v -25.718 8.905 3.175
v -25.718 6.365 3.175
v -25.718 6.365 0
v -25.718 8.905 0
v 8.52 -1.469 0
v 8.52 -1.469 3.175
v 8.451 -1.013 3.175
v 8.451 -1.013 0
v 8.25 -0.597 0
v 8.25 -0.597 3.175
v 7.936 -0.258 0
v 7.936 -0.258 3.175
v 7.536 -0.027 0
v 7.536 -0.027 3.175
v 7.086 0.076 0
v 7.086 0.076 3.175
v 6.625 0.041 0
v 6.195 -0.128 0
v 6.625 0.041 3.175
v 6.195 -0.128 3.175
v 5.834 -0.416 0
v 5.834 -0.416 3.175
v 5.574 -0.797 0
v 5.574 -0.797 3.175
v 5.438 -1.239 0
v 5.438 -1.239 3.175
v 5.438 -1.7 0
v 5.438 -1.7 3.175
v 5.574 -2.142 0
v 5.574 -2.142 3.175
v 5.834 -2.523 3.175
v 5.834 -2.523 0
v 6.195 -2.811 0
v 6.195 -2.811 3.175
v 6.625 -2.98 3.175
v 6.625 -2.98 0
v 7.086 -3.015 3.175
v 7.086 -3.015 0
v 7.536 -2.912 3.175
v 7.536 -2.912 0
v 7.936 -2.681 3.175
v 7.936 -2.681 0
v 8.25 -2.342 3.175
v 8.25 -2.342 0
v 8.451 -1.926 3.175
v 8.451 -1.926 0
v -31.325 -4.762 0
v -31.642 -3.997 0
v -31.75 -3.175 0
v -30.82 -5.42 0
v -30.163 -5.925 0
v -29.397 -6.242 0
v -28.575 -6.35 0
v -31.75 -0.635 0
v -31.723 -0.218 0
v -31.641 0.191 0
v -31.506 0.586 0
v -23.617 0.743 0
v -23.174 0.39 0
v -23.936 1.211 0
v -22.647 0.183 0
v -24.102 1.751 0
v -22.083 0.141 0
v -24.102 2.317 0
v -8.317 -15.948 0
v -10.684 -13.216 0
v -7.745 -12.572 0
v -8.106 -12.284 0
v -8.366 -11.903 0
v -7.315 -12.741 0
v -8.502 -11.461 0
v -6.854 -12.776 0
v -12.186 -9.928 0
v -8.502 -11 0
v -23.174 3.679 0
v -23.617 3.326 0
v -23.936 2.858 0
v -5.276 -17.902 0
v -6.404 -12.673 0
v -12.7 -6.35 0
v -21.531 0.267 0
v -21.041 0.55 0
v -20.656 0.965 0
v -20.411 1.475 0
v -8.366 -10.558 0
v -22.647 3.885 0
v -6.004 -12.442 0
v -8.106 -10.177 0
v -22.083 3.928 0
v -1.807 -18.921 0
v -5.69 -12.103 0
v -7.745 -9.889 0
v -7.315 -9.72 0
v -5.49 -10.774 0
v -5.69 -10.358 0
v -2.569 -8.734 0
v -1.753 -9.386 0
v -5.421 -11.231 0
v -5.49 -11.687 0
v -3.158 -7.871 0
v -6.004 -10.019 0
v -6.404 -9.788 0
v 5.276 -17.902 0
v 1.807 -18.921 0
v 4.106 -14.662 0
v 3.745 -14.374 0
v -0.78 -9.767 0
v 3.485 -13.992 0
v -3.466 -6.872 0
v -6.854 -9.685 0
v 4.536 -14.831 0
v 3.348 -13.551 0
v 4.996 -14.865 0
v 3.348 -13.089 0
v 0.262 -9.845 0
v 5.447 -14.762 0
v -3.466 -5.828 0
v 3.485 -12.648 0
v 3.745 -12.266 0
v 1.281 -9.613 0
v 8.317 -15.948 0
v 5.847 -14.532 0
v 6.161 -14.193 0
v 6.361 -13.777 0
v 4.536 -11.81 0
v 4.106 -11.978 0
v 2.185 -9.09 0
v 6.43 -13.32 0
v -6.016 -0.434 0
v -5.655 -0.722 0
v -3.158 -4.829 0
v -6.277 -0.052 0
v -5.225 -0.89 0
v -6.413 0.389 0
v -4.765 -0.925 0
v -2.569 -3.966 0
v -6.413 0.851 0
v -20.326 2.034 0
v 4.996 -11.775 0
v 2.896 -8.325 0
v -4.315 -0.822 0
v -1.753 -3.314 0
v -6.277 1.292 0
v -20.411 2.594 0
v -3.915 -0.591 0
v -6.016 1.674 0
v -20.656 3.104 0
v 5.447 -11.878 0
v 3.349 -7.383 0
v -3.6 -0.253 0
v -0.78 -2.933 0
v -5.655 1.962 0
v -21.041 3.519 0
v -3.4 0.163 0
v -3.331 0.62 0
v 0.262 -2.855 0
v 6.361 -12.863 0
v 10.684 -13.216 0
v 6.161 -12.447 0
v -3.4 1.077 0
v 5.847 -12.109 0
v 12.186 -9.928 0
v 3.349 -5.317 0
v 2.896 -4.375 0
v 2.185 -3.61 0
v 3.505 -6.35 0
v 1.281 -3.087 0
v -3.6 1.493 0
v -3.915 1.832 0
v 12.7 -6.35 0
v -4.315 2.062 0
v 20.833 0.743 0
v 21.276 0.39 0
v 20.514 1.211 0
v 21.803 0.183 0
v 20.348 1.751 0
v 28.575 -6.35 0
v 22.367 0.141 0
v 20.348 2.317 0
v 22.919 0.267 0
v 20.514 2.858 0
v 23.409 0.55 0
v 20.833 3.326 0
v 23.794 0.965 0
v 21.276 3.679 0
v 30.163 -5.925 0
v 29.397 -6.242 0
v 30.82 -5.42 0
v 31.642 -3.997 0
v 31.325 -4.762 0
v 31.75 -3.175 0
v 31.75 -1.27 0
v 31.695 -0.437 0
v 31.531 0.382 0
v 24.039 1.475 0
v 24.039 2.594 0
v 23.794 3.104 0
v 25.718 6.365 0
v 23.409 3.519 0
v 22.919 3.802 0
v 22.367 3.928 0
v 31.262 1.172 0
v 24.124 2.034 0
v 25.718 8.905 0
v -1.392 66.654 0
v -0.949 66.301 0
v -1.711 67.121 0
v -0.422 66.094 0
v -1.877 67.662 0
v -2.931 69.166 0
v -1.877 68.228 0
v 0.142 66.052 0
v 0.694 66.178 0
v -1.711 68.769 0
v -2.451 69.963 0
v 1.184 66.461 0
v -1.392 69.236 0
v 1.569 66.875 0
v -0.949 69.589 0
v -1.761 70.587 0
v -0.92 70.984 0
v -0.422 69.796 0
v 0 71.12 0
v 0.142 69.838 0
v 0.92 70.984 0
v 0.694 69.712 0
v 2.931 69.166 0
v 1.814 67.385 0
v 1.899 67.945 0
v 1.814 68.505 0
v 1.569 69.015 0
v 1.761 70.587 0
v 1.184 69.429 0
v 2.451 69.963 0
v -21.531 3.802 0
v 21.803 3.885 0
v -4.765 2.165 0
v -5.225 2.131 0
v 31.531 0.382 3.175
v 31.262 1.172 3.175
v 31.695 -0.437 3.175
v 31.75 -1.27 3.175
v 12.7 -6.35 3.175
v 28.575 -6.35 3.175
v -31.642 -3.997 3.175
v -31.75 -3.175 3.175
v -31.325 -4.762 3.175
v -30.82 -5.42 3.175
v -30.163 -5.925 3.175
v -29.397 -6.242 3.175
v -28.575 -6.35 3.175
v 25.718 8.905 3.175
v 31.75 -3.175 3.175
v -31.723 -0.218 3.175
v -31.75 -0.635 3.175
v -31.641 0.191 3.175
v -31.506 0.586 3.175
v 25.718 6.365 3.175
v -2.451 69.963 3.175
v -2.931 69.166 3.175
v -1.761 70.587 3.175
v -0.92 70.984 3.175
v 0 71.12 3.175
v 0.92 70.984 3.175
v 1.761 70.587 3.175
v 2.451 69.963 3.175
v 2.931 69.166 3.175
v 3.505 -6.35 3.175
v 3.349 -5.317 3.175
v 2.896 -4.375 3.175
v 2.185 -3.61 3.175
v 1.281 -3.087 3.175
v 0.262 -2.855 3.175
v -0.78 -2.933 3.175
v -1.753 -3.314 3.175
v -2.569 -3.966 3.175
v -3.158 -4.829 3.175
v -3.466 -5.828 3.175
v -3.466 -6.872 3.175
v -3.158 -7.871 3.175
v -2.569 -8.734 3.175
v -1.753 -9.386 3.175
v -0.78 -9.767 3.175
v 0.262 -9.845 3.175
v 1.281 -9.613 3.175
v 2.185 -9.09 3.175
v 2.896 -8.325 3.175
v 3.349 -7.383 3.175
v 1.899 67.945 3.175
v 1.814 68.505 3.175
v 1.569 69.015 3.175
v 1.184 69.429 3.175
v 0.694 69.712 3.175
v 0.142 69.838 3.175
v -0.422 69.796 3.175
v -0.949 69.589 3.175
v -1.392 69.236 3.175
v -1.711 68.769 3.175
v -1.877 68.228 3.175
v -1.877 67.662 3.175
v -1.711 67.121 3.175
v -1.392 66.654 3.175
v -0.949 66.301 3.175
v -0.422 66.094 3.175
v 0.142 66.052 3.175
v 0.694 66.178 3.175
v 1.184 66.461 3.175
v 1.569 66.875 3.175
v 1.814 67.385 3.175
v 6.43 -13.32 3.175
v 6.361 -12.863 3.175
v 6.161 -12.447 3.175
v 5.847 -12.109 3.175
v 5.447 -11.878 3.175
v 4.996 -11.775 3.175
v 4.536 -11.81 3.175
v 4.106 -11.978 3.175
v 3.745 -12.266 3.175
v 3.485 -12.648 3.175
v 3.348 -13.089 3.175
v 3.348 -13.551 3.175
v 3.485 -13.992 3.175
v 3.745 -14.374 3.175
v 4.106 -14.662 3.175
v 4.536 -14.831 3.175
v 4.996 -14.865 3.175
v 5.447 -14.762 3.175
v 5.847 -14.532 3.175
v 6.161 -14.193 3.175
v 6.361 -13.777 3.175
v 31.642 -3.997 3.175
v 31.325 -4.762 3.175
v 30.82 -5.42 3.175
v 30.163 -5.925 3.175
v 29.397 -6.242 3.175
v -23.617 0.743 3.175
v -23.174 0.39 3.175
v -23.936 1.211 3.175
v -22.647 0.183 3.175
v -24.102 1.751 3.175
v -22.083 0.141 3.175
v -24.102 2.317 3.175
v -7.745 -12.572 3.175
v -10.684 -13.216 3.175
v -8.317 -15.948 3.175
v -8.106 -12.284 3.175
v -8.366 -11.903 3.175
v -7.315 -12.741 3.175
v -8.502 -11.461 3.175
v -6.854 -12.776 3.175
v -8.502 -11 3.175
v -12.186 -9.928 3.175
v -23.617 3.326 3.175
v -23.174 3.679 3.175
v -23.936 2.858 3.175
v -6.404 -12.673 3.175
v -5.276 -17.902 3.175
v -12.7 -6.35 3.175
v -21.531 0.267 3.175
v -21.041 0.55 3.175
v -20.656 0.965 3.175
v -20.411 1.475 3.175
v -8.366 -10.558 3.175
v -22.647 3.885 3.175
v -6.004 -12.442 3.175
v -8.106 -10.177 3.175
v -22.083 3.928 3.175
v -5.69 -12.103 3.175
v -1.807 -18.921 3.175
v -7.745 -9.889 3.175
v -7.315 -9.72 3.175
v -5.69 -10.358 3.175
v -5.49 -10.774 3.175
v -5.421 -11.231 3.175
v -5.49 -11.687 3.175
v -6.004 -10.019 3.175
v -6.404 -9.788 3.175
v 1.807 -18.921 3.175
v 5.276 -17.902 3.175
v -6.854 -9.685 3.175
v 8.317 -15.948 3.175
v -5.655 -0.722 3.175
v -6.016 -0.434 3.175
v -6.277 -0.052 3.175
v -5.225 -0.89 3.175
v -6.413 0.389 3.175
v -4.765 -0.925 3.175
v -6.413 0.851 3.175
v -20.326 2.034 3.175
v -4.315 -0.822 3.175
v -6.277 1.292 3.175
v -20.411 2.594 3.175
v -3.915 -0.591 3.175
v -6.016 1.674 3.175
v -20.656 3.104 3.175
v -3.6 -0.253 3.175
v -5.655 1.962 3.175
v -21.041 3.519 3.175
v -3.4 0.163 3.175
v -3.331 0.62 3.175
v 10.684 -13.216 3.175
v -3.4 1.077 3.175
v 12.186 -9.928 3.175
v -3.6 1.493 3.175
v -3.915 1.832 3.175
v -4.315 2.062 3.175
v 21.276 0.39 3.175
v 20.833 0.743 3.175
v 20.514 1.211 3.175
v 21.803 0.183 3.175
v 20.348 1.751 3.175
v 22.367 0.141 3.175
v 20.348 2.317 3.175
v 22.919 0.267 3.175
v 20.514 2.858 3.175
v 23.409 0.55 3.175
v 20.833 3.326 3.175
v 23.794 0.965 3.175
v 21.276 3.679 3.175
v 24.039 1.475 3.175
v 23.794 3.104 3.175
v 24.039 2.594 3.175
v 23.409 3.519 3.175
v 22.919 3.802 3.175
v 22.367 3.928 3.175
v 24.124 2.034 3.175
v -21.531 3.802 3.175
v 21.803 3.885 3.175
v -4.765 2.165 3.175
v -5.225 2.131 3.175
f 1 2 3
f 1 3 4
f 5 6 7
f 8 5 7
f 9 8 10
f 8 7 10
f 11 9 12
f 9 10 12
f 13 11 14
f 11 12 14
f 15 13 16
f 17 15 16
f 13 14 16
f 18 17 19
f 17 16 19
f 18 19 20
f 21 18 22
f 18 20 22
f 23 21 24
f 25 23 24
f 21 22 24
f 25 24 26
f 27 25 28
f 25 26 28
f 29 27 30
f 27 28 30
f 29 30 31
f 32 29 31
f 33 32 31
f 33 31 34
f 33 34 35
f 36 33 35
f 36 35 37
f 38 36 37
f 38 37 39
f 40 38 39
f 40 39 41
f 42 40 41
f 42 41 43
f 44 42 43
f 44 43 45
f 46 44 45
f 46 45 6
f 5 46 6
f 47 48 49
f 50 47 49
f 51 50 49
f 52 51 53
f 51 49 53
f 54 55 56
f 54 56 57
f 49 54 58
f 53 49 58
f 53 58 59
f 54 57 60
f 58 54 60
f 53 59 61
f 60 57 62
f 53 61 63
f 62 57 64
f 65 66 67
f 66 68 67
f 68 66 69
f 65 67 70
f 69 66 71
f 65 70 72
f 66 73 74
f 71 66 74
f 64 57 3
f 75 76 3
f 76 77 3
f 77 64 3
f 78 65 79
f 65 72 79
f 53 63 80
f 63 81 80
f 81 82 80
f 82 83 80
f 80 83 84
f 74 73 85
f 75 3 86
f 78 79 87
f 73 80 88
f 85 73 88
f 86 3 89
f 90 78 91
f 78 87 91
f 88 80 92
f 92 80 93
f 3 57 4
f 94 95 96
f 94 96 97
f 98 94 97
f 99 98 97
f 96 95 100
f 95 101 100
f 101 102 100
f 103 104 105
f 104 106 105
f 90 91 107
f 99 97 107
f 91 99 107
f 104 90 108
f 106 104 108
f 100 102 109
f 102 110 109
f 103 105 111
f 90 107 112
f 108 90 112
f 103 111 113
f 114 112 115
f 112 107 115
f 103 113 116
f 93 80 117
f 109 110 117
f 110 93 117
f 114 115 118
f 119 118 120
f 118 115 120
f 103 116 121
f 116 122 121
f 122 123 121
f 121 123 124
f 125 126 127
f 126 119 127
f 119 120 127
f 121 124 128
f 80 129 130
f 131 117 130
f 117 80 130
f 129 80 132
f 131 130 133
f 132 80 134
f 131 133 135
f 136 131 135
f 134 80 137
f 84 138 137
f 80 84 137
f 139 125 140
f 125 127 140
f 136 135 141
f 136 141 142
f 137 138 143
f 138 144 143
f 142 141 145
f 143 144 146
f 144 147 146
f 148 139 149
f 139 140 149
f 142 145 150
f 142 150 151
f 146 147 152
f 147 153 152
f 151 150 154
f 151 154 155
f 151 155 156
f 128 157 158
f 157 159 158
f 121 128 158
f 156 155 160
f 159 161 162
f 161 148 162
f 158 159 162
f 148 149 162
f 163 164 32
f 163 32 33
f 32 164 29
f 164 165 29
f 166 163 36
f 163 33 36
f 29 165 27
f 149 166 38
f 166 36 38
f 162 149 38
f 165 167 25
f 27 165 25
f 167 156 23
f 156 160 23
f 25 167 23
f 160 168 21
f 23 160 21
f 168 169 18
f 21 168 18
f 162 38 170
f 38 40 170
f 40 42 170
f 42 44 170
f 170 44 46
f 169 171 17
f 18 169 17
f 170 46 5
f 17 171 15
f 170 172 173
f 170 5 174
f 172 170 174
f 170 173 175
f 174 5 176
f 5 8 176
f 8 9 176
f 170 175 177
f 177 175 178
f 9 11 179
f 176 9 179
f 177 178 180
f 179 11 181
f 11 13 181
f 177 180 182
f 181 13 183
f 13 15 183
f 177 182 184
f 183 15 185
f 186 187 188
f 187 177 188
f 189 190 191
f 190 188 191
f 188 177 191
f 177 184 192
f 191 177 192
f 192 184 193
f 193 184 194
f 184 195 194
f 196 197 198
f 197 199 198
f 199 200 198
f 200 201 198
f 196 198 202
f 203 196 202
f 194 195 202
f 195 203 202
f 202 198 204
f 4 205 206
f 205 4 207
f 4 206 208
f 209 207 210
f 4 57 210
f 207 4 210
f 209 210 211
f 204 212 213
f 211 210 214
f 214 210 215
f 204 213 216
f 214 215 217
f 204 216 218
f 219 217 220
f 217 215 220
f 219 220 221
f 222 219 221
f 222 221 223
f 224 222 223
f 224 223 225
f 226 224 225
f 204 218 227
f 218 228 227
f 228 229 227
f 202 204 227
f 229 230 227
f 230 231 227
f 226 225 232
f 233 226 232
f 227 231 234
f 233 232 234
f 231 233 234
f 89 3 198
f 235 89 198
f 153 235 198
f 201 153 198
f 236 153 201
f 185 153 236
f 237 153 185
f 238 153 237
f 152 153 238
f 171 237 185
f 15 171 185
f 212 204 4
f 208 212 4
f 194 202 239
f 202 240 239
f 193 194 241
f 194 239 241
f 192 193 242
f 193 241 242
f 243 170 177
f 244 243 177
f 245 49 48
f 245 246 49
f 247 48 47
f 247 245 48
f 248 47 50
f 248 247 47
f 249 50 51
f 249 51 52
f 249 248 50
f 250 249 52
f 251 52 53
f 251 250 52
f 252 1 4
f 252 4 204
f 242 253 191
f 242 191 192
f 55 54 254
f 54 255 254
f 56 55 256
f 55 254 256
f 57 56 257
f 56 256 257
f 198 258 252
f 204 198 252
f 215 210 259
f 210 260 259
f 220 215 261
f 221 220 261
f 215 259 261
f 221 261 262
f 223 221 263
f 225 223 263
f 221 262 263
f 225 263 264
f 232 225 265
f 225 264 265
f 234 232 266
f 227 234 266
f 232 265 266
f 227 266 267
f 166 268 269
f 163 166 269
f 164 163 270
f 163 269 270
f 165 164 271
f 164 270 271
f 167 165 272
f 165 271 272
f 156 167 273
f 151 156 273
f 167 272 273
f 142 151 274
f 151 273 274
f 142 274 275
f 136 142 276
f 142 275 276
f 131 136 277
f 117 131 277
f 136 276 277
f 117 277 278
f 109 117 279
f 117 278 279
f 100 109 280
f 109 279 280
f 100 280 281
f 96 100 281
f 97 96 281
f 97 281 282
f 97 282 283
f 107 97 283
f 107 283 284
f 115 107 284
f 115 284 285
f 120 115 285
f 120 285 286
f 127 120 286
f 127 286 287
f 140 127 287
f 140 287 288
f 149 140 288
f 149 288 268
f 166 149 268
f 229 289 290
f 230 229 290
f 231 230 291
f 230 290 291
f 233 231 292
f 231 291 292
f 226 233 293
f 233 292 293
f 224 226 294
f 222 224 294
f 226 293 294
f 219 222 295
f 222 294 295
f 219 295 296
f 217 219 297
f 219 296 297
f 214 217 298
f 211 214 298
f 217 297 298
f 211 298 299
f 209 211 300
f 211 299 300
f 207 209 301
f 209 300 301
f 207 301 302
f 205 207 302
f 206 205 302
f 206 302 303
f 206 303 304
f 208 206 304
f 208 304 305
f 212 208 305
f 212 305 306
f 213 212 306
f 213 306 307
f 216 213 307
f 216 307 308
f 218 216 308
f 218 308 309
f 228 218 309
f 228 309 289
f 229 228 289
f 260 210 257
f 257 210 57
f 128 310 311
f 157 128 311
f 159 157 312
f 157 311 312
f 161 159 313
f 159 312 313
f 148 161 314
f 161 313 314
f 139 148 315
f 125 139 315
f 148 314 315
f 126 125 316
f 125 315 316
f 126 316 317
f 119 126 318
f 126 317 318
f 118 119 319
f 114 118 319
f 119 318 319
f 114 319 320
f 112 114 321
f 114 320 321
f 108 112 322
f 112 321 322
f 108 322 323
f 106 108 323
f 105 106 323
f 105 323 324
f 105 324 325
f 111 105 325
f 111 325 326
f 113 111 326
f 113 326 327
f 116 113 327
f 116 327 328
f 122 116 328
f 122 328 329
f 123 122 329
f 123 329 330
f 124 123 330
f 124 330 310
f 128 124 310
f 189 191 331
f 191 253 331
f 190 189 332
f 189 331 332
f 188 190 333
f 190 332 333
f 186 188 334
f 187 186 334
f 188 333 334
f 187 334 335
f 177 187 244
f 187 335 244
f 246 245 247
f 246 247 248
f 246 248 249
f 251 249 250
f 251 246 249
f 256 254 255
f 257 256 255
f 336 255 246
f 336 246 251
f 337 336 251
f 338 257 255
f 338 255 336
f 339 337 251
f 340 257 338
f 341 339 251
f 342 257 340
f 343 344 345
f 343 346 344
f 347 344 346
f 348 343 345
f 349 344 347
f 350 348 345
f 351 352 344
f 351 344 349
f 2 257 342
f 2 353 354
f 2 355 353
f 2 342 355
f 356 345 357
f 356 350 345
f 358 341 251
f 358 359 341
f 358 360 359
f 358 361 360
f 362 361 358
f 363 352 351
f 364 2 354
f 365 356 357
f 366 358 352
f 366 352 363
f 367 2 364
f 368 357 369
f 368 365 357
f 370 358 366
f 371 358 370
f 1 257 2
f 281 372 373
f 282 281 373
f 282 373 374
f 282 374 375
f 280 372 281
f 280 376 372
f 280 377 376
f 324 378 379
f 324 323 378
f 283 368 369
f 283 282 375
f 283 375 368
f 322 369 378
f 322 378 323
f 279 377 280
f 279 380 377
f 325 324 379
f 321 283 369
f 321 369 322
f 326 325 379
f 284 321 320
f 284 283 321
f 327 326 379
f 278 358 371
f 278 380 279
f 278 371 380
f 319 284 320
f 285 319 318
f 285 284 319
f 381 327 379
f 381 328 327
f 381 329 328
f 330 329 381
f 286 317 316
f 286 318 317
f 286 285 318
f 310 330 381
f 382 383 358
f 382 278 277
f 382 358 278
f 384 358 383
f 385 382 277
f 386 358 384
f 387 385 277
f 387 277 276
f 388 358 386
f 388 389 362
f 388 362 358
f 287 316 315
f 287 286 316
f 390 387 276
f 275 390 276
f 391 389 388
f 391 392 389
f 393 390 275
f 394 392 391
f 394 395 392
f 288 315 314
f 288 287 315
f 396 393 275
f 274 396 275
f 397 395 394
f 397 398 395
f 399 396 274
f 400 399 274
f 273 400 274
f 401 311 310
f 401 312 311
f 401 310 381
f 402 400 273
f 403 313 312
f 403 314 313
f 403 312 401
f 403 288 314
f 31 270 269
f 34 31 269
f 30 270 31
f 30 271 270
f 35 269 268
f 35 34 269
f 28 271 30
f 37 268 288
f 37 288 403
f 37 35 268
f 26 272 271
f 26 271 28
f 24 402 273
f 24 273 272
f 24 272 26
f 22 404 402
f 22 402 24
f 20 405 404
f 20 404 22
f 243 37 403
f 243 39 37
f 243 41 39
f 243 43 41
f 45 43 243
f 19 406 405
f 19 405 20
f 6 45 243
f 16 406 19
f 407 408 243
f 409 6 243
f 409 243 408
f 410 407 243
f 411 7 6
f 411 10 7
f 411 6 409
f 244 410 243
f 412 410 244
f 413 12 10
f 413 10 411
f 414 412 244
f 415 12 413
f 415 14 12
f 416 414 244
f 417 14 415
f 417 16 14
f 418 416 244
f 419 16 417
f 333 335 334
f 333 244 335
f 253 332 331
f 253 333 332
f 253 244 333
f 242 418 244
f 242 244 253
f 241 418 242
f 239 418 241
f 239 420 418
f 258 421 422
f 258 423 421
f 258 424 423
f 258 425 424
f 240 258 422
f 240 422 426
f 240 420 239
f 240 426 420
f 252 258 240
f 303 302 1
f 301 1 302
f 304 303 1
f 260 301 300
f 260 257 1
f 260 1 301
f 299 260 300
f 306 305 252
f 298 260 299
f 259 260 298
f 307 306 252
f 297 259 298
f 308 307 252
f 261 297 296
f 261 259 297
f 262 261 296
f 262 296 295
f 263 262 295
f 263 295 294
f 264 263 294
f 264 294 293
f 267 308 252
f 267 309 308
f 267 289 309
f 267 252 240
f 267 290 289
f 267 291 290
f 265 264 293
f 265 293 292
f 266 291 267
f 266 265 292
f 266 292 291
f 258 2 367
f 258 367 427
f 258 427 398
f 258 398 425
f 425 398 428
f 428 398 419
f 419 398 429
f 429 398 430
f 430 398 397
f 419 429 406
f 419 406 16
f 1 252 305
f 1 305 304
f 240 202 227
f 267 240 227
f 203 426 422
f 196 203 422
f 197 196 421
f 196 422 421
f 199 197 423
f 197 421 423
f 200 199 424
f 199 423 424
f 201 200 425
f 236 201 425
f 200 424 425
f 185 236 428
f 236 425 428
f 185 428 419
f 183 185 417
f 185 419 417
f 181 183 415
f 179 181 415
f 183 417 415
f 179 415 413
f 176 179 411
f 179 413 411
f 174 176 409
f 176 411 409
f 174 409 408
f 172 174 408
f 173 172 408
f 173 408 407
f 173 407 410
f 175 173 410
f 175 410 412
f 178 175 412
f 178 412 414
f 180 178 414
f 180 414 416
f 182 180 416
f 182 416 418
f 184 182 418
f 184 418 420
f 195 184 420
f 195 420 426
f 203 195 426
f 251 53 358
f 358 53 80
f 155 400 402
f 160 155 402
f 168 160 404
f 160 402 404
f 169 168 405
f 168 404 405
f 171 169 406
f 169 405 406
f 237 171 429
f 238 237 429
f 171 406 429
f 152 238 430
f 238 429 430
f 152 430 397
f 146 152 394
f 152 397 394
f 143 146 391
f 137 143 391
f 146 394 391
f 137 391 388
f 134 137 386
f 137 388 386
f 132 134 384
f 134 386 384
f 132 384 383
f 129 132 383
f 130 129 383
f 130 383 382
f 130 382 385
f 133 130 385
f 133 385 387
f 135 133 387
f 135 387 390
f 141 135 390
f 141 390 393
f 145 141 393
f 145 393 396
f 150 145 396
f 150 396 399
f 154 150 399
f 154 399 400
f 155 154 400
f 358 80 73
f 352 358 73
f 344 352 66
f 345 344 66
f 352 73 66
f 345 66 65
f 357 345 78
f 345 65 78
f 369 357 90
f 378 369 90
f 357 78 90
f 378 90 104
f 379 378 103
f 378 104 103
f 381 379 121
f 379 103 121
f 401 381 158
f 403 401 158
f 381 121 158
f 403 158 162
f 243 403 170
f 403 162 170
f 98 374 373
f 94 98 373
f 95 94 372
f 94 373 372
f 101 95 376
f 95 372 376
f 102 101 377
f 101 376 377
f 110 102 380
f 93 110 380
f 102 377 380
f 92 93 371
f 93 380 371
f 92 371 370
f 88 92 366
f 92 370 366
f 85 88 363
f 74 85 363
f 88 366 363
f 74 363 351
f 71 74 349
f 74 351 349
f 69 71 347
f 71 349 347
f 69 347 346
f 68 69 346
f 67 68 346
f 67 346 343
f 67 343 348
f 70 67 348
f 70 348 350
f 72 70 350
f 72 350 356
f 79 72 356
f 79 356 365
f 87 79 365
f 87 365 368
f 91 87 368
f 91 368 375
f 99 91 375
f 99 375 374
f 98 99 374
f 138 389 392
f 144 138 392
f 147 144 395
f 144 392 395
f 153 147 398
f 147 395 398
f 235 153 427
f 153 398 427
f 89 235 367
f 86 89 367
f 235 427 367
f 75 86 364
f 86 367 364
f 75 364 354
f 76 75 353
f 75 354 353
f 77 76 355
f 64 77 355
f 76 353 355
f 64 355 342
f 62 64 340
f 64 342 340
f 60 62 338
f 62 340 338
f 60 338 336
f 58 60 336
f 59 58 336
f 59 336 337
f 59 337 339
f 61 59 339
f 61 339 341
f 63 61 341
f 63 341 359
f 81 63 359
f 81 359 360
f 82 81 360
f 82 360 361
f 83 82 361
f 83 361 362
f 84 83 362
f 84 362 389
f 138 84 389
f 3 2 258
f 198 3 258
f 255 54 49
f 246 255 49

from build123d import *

# Parameters (mm, degrees)
BOSS_EXTRUDE1_DEPTH = 3.175
FILLET4_R           = 3.175
FILLET5_R           = 3.175
FILLET6_R           = 3.175
FILLET7_R           = 6.35
FILLET8_R           = 3.175
SKETCH2_R           = 3.5052
SKETCH2_R_2         = 1.5494
CUT_EXTRUDE1_DEPTH  = 4.175
SKETCH4_W           = 51.435
SKETCH4_H           = 2.54
CUT_EXTRUDE2_DEPTH  = 4.175
SKETCH10_R          = 1.89865
CUT_EXTRUDE3_DEPTH  = 4.175
SKETCH11_R          = 1.89865
CUT_EXTRUDE4_DEPTH  = 4.175


with BuildPart() as part:
    # Sketch1 → Boss-Extrude1 (new body)
    with BuildSketch(Plane.XY):
        with BuildLine():
            Line((-31.75, 0), (-31.75, -6.35))
            Line((-31.75, -6.35), (-12.7, -6.35))
            ThreePointArc((-12.7, -6.35), (0, -19.05), (12.7, -6.35))
            Line((12.7, -6.35), (31.75, -6.35))
            Line((31.75, -6.35), (31.75, 0))
            Line((31.75, 0), (0, 76.2))
            Line((0, 76.2), (-31.75, 0))
        make_face()
    extrude(amount=BOSS_EXTRUDE1_DEPTH)

    # Fillet4
    fillet4_edges = [part.edges().sort_by_distance(p)[0] for p in [
        (-31.75, -6.35, 1.5875),
    ]]
    fillet(fillet4_edges, radius=FILLET4_R)

    # Fillet5
    fillet5_edges = [part.edges().sort_by_distance(p)[0] for p in [
        (-31.75, 0, 1.5875),
    ]]
    fillet(fillet5_edges, radius=FILLET5_R)

    # Fillet6
    fillet6_edges = [part.edges().sort_by_distance(p)[0] for p in [
        (0, 76.2, 1.5875),
    ]]
    fillet(fillet6_edges, radius=FILLET6_R)

    # Fillet7
    fillet7_edges = [part.edges().sort_by_distance(p)[0] for p in [
        (31.75, 0, 1.5875),
    ]]
    fillet(fillet7_edges, radius=FILLET7_R)

    # Fillet8
    fillet8_edges = [part.edges().sort_by_distance(p)[0] for p in [
        (31.75, -6.35, 1.5875),
    ]]
    fillet(fillet8_edges, radius=FILLET8_R)

    # Sketch2 → Cut-Extrude1 (cut, through all)
    with BuildSketch(Plane.XY.offset(3.175)):
        with Locations((0, -6.35)):
            Circle(SKETCH2_R)
        with Locations((-4.880561897, 0.620164745)):
            Circle(SKETCH2_R_2)
        with Locations((4.880561897, -13.320164745)):
            Circle(SKETCH2_R_2)
        with Locations((6.970164745, -1.469438103)):
            Circle(SKETCH2_R_2)
        with Locations((-6.970164745, -11.230561897)):
            Circle(SKETCH2_R_2)
    extrude(amount=-CUT_EXTRUDE1_DEPTH, mode=Mode.SUBTRACT)

    # Sketch4 → Cut-Extrude2 (cut, through all)
    with BuildSketch(Plane.XY.offset(3.175)):
        with Locations((0, 7.634999946)):
            Rectangle(SKETCH4_W, SKETCH4_H)
    extrude(amount=-CUT_EXTRUDE2_DEPTH, mode=Mode.SUBTRACT)

    # Sketch10 → Cut-Extrude3 (cut, through all)
    with BuildSketch(Plane.XY.offset(3.175)):
        with Locations((-22.225, 2.034299946)):
            Circle(SKETCH10_R)
        with Locations((22.225, 2.034299946)):
            Circle(SKETCH10_R)
    extrude(amount=-CUT_EXTRUDE3_DEPTH, mode=Mode.SUBTRACT)

    # Sketch11 → Cut-Extrude4 (cut, through all)
    with BuildSketch(Plane.XY.offset(3.175)):
        with Locations((0, 67.945)):
            Circle(SKETCH11_R)
    extrude(amount=-CUT_EXTRUDE4_DEPTH, mode=Mode.SUBTRACT)


solid = part.part
